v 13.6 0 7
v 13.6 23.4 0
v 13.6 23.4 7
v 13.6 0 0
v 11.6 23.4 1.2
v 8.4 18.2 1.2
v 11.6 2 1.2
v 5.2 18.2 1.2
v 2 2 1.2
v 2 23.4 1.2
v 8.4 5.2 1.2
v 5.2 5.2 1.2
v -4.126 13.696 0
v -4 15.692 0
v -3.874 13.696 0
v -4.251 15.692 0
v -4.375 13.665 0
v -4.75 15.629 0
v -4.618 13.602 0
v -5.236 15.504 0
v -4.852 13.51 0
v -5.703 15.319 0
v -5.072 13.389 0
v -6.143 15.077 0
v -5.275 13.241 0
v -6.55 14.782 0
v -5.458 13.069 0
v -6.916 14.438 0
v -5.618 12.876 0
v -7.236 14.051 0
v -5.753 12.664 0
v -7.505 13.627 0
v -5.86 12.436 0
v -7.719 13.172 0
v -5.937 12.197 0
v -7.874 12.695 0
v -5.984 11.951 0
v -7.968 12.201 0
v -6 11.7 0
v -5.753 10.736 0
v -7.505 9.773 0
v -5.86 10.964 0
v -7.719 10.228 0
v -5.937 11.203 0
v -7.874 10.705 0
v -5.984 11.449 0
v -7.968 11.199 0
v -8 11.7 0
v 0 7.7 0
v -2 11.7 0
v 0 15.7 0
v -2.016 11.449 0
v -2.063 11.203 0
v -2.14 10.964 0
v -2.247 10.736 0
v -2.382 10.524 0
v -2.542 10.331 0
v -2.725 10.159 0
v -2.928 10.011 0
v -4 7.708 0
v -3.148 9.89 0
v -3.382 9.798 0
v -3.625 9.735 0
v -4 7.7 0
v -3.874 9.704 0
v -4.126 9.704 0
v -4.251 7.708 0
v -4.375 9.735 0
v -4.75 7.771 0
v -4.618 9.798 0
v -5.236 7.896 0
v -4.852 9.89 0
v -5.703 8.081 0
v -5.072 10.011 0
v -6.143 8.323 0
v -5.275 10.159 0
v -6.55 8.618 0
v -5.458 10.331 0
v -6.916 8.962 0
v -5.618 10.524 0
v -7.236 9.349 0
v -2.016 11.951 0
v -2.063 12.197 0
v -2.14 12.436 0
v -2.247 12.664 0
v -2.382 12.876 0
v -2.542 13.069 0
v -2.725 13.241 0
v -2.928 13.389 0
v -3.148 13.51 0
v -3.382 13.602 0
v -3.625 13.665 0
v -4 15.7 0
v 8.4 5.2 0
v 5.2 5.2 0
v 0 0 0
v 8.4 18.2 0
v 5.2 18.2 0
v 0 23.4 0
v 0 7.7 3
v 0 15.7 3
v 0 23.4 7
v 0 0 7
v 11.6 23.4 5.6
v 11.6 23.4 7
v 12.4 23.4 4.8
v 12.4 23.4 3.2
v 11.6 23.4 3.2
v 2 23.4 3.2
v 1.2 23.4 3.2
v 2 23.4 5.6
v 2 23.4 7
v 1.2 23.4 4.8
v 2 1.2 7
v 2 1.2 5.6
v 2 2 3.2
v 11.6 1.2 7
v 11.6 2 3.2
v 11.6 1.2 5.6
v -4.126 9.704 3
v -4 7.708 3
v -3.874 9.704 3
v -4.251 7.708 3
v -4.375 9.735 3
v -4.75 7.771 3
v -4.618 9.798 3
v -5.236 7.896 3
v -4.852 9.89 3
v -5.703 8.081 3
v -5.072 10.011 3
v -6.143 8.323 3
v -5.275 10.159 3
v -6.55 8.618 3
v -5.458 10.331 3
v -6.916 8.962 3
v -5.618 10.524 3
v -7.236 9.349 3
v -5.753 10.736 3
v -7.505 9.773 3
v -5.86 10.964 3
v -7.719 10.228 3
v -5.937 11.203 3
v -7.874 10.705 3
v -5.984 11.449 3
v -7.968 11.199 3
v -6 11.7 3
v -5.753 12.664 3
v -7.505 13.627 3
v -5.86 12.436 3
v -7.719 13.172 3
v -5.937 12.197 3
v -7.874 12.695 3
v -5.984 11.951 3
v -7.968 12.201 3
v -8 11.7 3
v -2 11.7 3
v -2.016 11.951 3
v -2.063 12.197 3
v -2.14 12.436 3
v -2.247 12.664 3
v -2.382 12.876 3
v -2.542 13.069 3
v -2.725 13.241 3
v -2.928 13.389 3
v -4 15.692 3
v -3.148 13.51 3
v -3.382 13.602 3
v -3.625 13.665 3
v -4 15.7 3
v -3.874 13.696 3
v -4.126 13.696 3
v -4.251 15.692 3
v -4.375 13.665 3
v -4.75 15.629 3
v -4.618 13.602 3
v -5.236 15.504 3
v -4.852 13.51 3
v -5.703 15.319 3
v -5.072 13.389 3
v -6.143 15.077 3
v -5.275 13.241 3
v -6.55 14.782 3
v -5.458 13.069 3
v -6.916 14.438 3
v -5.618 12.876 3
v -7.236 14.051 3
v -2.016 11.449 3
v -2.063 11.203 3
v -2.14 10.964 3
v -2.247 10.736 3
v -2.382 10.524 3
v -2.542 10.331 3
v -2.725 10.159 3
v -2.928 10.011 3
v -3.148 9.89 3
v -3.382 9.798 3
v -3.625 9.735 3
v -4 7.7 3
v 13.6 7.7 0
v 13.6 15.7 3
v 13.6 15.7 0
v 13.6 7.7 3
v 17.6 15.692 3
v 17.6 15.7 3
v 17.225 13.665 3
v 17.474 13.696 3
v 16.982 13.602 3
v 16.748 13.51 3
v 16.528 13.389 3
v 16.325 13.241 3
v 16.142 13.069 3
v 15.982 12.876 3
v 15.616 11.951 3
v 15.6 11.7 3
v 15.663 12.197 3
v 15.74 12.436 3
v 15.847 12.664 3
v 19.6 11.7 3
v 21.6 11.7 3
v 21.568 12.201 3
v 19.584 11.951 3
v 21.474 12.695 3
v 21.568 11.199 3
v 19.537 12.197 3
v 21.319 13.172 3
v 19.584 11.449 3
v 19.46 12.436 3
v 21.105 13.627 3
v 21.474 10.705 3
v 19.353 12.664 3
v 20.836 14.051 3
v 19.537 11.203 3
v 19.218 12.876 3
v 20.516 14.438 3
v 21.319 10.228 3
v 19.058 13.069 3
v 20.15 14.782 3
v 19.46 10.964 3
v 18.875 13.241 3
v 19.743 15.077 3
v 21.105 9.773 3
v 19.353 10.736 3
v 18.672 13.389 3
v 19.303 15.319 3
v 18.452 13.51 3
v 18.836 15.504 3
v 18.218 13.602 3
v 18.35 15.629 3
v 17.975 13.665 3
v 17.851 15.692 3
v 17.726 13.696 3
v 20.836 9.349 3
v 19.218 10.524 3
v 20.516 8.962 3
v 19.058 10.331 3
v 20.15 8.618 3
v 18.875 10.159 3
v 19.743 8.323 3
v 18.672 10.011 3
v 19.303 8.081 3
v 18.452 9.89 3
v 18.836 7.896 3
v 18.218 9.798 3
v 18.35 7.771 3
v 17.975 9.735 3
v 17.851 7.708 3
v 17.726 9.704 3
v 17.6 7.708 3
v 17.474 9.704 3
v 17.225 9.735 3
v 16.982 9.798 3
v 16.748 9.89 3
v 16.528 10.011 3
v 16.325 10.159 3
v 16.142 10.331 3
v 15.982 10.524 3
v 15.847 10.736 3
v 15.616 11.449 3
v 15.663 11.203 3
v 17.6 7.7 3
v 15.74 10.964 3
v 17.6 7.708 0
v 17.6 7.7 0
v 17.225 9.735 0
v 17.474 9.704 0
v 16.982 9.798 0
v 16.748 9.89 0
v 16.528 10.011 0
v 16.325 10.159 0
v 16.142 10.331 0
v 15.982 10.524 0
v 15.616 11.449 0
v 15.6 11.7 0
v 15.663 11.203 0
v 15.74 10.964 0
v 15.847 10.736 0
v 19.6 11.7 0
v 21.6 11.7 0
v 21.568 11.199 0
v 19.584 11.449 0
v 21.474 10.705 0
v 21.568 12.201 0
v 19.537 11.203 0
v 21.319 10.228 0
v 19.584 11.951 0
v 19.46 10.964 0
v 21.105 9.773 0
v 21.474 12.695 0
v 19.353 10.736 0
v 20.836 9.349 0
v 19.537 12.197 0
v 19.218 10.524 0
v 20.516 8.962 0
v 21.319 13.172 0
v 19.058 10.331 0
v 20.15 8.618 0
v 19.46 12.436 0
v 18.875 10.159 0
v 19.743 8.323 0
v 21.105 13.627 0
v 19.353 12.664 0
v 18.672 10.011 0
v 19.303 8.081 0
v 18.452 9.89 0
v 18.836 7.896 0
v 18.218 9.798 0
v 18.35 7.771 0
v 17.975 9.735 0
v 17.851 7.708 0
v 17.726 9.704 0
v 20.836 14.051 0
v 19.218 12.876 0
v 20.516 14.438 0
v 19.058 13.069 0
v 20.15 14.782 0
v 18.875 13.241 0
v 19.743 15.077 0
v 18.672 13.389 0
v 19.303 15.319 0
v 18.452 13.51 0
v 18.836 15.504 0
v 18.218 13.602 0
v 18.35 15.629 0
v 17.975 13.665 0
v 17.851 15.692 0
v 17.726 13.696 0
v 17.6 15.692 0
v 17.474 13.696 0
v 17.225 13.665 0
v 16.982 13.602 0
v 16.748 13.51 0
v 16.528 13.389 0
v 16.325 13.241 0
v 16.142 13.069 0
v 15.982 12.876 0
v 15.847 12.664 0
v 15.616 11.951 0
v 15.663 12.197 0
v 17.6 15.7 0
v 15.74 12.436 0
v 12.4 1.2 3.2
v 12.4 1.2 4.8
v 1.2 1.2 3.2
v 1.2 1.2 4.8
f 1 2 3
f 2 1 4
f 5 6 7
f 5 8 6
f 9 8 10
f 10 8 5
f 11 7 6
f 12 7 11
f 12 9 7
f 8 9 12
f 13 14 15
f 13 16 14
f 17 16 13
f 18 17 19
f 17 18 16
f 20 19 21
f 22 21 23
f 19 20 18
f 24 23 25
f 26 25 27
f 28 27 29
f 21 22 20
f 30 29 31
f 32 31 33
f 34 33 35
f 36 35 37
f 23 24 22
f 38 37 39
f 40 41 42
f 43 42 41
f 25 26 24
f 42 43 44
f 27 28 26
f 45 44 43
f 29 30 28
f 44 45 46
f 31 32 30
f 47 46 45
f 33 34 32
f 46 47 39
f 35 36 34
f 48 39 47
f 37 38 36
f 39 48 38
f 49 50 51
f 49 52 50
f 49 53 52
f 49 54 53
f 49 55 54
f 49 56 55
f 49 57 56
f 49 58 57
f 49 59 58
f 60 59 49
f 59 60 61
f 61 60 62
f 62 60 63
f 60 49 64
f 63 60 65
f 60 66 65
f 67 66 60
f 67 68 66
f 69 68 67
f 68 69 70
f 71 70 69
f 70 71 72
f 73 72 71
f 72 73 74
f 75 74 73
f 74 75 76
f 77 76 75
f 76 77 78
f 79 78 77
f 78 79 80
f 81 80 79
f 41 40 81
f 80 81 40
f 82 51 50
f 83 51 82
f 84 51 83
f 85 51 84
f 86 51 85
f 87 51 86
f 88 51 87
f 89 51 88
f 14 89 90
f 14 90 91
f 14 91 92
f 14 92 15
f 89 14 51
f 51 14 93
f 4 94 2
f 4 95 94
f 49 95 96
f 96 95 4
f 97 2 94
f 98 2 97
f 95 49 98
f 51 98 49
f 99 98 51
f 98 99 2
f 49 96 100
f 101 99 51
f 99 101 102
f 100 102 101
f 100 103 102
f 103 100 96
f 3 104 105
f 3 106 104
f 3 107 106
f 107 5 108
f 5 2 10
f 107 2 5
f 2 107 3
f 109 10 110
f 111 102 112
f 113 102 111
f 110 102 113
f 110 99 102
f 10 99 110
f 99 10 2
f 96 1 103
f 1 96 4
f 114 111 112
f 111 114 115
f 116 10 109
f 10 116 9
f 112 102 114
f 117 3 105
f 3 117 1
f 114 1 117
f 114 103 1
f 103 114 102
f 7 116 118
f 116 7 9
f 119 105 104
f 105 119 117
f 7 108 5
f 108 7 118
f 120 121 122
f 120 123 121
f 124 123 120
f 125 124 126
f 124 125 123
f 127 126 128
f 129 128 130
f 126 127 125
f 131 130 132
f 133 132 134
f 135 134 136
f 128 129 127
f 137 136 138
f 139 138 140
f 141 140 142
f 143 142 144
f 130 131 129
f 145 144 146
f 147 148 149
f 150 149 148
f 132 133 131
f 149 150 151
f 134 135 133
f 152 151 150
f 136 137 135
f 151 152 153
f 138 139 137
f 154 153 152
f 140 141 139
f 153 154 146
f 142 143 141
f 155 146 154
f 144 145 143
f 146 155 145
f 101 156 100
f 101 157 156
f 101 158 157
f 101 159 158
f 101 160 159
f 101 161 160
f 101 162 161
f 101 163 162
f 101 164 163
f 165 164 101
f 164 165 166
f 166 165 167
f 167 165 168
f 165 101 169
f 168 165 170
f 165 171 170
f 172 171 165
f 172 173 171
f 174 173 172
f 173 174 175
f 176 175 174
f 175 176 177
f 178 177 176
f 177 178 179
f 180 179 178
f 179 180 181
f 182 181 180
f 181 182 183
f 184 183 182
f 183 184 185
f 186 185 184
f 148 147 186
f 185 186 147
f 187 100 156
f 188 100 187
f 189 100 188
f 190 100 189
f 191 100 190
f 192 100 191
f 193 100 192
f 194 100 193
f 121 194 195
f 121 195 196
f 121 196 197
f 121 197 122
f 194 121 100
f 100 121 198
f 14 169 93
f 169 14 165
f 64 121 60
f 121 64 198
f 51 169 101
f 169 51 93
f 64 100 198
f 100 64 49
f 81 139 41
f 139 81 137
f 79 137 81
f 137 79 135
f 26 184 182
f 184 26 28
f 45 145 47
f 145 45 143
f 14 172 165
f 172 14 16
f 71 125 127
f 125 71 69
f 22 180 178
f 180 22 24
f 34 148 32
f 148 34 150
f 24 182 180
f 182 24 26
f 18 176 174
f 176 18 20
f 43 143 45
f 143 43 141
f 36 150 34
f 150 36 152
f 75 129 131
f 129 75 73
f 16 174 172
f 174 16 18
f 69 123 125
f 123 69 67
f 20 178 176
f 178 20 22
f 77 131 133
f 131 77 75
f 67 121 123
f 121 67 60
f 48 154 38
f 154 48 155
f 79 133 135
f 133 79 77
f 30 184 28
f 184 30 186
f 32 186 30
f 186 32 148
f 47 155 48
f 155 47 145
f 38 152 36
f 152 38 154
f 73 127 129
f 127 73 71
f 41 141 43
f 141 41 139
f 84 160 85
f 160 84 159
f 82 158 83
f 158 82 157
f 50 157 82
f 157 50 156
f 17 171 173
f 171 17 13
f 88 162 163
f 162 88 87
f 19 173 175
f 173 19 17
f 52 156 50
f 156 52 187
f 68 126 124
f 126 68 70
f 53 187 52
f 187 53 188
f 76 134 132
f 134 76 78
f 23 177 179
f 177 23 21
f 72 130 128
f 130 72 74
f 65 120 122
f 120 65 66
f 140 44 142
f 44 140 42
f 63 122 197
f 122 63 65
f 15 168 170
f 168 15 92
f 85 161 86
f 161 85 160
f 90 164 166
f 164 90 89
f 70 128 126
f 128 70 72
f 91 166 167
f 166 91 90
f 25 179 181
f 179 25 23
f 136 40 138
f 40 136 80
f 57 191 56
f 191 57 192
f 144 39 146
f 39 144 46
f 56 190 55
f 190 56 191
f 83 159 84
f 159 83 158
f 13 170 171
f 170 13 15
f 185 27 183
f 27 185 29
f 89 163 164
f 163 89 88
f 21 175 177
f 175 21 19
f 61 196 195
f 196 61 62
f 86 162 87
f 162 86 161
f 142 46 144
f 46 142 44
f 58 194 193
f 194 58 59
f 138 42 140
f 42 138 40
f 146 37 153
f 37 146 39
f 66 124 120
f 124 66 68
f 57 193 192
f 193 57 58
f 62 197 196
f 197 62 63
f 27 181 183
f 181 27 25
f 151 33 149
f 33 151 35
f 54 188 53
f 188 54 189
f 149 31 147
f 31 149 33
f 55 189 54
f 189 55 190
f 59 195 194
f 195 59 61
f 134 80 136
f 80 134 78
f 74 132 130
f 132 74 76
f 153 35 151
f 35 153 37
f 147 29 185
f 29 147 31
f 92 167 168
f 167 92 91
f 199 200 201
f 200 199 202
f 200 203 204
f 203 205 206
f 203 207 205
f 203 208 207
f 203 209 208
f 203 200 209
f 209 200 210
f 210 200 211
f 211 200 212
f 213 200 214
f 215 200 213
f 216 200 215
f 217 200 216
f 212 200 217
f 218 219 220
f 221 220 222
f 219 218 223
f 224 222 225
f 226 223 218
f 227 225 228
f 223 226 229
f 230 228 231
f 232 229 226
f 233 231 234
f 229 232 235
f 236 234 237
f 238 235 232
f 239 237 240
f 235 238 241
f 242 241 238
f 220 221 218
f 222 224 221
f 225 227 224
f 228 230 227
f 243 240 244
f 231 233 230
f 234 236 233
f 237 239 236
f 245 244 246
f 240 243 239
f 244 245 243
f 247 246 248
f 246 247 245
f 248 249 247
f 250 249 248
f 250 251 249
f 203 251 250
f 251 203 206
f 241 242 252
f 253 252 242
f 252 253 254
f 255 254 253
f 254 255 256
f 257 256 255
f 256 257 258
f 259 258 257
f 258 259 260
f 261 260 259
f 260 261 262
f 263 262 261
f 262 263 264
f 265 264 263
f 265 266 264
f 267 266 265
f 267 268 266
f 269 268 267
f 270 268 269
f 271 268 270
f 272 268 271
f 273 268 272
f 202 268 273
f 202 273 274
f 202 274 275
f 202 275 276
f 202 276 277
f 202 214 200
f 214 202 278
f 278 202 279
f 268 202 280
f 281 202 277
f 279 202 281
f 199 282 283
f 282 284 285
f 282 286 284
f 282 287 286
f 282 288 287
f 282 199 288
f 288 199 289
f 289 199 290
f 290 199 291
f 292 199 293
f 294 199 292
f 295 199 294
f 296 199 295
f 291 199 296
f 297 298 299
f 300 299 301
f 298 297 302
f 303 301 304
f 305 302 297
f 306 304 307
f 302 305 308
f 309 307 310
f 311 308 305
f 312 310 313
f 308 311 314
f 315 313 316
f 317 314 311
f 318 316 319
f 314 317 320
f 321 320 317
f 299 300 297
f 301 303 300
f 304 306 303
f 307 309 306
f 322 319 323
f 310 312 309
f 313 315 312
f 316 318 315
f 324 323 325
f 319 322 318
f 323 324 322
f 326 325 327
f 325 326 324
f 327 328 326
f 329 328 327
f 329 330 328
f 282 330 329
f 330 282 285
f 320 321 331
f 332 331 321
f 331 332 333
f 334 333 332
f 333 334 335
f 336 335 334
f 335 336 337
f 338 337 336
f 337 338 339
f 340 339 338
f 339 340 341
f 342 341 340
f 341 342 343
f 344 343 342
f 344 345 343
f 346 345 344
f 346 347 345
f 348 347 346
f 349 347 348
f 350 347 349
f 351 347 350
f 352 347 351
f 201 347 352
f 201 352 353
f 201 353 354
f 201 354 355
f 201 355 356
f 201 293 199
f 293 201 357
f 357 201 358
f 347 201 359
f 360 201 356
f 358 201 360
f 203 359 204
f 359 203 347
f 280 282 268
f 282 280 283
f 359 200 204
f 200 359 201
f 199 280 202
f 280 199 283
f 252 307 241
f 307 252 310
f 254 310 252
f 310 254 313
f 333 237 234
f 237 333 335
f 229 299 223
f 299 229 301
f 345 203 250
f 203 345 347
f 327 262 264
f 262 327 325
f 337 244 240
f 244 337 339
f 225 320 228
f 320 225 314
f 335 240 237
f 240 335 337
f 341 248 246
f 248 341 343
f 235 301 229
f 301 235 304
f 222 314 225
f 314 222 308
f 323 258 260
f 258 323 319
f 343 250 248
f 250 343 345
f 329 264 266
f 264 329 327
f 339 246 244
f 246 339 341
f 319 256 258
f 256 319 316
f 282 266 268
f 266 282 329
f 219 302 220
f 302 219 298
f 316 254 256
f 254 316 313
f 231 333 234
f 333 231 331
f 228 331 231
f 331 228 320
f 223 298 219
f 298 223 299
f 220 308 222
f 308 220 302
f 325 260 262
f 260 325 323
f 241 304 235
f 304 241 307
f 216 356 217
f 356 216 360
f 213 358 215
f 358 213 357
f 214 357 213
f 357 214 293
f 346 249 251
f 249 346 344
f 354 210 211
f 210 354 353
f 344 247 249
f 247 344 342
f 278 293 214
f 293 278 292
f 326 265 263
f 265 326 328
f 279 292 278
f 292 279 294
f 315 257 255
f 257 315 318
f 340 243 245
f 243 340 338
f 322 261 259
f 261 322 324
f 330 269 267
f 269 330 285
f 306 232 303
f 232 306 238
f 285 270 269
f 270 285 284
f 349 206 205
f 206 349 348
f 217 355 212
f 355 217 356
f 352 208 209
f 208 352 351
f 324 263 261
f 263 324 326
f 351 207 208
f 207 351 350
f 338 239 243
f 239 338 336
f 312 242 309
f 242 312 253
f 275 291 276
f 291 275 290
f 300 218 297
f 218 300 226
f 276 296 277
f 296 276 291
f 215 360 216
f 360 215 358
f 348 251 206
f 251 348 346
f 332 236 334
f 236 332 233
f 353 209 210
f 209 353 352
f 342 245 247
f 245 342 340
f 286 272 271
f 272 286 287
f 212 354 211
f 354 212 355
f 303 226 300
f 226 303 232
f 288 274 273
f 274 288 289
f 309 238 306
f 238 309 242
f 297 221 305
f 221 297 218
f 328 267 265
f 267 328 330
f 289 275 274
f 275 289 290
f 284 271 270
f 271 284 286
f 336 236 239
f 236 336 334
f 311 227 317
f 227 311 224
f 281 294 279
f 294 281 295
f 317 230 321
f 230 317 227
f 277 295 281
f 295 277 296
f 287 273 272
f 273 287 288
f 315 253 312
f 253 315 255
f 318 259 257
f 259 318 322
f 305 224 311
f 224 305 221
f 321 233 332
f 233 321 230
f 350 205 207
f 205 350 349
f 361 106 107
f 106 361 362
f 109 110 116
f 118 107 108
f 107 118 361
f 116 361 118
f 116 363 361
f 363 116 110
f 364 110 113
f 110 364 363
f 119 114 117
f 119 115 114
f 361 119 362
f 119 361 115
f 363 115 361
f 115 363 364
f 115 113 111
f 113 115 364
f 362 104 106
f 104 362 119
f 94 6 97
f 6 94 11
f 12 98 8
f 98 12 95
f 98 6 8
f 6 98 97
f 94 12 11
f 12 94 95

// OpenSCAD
// file: ../lib/pcb_led_cvf.scad
// for led power module modified

/* bluetooth_mate_holder.scad
 * By John Biehler - November 17, 2011
 * http://www.thingiverse.com/thing:

 * derived from pcb_box_slide_with_tabs.scad
 * By Nicholas C Lewis - Jan 1, 2011
 * http://www.thingiverse.com/thing:5396
 *
 * derived from pcb_box_slide.scad
 *     Parametric, open PCB-box (slide-in) by chlunde
 *     http://www.thingiverse.com/thing:4071
 *
 * CHANGES
 * - adjusted to fit Arduino Mega
 * - added mounting tabs
 * - turned off cutouts
 * - adjusted bottom cutout size
 */

$fn=50;

module pcb_led_cvf(

	pcb_width = 48.2,
	pcb_length =24.1,
	pcb_height =1.1,
	slisse = 0.8,

	pcb_bottom_margin = 1,
	wall_width_thick = 2,
	box_height = 7,

	//tab parameters
	tab_hole_radius=2,
	tab_outer_radius=4,

	inner_margin = 4,

	add_tabs = true

) {
	wall_width = wall_width_thick-slisse;

module tab() {
	difference(){
		union() {
			translate([-tab_outer_radius,-tab_outer_radius,0])
			cube([tab_outer_radius,2*tab_outer_radius,wall_width_thick+1]);
			translate([-tab_outer_radius,0,0])
				cylinder(r=tab_outer_radius, h = wall_width_thick+1);
		}
		translate([-tab_outer_radius,0,0]) {
			cylinder(r= tab_hole_radius, h = wall_width_thick+5,center=true);
		}
	}

}

module box() {
	union() {
		cube([pcb_width + 2*wall_width, pcb_length + 2*wall_width, wall_width]);

		cube([wall_width_thick, pcb_length + 2*wall_width, box_height]);

		cube([pcb_width + 2*wall_width, wall_width_thick, box_height]);

		%translate([0, pcb_length+wall_width, 0])
			cube([pcb_width + 2*wall_width,wall_width,box_height]);

		translate([pcb_width + wall_width - slisse,0,0])
			cube([wall_width_thick, pcb_length + 2*wall_width, box_height]);
	}
	if(add_tabs) {
//comment out this part to remove tabs
		for(i=[(pcb_length + 2*wall_width)/2]){
	translate([0,i,0])tab();
	translate([pcb_width + 2*wall_width,i,0])mirror()tab();
		}
	}

}

module pcb() {
	translate([wall_width, wall_width, wall_width + pcb_bottom_margin])
		cube([pcb_width,pcb_length + wall_width + 0.1,pcb_height]);
	translate([wall_width, wall_width, wall_width + pcb_bottom_margin+pcb_height])rotate([0,45,0])
		cube([pcb_height,pcb_length + wall_width + 0.1,pcb_height]);
	translate([wall_width+pcb_width-2*cos(45)*pcb_height, wall_width, wall_width + pcb_bottom_margin+pcb_height])rotate([0,45,0])
		cube([pcb_height,pcb_length + wall_width + 0.1,pcb_height]);
	translate([wall_width_thick, wall_width, wall_width + pcb_bottom_margin])
		cube([pcb_width-2*slisse,pcb_length + wall_width + 0.1,box_height]);

}



module holes() {
		*translate([wall_width + pcb_width/2, wall_width_thick + 0.1, pcb_width/2+wall_width])
			rotate(a=90,v=[1,0,0])
				cylinder(r=pcb_width/2, h=wall_width_thick + 0.2);

		*translate([-0.1, wall_width + pcb_length/2, pcb_length/2 + wall_width])
			rotate(a=90,v=[0,1,0])
				cylinder(r=pcb_length/2, h=wall_width_thick + 0.2);

		*translate([pcb_width + wall_width - slisse - 0.1, wall_width + pcb_length/2, pcb_length/2 + wall_width])
			rotate(a=90,v=[0,1,0])
				cylinder(r=pcb_length/2, h=wall_width_thick + 0.2);

	 * translate([pcb_width/2 + wall_width, wall_width + pcb_length/2, -0.1])
			rotate(a=0,v=[0,1,0])
				cylinder(r=min(pcb_length,pcb_width)/2 - wall_width/2, h=wall_width_thick + 0.2);

		translate([inner_margin +wall_width, inner_margin+wall_width, -0.1])
			cube([pcb_width-inner_margin*2,pcb_length -inner_margin*2,wall_width + 0.2]);
}

	difference() {
		box();
		pcb();
		holes();
	}
}



pcb_led_cvf();
// main file
use <../lib/pcb_led_cvf.scad>

$fn = 50;

pcb_led_cvf(
  pcb_length=21,
  pcb_width=11.2,
  pcb_height=1.6,
  pcb_bottom_margin=2
);
